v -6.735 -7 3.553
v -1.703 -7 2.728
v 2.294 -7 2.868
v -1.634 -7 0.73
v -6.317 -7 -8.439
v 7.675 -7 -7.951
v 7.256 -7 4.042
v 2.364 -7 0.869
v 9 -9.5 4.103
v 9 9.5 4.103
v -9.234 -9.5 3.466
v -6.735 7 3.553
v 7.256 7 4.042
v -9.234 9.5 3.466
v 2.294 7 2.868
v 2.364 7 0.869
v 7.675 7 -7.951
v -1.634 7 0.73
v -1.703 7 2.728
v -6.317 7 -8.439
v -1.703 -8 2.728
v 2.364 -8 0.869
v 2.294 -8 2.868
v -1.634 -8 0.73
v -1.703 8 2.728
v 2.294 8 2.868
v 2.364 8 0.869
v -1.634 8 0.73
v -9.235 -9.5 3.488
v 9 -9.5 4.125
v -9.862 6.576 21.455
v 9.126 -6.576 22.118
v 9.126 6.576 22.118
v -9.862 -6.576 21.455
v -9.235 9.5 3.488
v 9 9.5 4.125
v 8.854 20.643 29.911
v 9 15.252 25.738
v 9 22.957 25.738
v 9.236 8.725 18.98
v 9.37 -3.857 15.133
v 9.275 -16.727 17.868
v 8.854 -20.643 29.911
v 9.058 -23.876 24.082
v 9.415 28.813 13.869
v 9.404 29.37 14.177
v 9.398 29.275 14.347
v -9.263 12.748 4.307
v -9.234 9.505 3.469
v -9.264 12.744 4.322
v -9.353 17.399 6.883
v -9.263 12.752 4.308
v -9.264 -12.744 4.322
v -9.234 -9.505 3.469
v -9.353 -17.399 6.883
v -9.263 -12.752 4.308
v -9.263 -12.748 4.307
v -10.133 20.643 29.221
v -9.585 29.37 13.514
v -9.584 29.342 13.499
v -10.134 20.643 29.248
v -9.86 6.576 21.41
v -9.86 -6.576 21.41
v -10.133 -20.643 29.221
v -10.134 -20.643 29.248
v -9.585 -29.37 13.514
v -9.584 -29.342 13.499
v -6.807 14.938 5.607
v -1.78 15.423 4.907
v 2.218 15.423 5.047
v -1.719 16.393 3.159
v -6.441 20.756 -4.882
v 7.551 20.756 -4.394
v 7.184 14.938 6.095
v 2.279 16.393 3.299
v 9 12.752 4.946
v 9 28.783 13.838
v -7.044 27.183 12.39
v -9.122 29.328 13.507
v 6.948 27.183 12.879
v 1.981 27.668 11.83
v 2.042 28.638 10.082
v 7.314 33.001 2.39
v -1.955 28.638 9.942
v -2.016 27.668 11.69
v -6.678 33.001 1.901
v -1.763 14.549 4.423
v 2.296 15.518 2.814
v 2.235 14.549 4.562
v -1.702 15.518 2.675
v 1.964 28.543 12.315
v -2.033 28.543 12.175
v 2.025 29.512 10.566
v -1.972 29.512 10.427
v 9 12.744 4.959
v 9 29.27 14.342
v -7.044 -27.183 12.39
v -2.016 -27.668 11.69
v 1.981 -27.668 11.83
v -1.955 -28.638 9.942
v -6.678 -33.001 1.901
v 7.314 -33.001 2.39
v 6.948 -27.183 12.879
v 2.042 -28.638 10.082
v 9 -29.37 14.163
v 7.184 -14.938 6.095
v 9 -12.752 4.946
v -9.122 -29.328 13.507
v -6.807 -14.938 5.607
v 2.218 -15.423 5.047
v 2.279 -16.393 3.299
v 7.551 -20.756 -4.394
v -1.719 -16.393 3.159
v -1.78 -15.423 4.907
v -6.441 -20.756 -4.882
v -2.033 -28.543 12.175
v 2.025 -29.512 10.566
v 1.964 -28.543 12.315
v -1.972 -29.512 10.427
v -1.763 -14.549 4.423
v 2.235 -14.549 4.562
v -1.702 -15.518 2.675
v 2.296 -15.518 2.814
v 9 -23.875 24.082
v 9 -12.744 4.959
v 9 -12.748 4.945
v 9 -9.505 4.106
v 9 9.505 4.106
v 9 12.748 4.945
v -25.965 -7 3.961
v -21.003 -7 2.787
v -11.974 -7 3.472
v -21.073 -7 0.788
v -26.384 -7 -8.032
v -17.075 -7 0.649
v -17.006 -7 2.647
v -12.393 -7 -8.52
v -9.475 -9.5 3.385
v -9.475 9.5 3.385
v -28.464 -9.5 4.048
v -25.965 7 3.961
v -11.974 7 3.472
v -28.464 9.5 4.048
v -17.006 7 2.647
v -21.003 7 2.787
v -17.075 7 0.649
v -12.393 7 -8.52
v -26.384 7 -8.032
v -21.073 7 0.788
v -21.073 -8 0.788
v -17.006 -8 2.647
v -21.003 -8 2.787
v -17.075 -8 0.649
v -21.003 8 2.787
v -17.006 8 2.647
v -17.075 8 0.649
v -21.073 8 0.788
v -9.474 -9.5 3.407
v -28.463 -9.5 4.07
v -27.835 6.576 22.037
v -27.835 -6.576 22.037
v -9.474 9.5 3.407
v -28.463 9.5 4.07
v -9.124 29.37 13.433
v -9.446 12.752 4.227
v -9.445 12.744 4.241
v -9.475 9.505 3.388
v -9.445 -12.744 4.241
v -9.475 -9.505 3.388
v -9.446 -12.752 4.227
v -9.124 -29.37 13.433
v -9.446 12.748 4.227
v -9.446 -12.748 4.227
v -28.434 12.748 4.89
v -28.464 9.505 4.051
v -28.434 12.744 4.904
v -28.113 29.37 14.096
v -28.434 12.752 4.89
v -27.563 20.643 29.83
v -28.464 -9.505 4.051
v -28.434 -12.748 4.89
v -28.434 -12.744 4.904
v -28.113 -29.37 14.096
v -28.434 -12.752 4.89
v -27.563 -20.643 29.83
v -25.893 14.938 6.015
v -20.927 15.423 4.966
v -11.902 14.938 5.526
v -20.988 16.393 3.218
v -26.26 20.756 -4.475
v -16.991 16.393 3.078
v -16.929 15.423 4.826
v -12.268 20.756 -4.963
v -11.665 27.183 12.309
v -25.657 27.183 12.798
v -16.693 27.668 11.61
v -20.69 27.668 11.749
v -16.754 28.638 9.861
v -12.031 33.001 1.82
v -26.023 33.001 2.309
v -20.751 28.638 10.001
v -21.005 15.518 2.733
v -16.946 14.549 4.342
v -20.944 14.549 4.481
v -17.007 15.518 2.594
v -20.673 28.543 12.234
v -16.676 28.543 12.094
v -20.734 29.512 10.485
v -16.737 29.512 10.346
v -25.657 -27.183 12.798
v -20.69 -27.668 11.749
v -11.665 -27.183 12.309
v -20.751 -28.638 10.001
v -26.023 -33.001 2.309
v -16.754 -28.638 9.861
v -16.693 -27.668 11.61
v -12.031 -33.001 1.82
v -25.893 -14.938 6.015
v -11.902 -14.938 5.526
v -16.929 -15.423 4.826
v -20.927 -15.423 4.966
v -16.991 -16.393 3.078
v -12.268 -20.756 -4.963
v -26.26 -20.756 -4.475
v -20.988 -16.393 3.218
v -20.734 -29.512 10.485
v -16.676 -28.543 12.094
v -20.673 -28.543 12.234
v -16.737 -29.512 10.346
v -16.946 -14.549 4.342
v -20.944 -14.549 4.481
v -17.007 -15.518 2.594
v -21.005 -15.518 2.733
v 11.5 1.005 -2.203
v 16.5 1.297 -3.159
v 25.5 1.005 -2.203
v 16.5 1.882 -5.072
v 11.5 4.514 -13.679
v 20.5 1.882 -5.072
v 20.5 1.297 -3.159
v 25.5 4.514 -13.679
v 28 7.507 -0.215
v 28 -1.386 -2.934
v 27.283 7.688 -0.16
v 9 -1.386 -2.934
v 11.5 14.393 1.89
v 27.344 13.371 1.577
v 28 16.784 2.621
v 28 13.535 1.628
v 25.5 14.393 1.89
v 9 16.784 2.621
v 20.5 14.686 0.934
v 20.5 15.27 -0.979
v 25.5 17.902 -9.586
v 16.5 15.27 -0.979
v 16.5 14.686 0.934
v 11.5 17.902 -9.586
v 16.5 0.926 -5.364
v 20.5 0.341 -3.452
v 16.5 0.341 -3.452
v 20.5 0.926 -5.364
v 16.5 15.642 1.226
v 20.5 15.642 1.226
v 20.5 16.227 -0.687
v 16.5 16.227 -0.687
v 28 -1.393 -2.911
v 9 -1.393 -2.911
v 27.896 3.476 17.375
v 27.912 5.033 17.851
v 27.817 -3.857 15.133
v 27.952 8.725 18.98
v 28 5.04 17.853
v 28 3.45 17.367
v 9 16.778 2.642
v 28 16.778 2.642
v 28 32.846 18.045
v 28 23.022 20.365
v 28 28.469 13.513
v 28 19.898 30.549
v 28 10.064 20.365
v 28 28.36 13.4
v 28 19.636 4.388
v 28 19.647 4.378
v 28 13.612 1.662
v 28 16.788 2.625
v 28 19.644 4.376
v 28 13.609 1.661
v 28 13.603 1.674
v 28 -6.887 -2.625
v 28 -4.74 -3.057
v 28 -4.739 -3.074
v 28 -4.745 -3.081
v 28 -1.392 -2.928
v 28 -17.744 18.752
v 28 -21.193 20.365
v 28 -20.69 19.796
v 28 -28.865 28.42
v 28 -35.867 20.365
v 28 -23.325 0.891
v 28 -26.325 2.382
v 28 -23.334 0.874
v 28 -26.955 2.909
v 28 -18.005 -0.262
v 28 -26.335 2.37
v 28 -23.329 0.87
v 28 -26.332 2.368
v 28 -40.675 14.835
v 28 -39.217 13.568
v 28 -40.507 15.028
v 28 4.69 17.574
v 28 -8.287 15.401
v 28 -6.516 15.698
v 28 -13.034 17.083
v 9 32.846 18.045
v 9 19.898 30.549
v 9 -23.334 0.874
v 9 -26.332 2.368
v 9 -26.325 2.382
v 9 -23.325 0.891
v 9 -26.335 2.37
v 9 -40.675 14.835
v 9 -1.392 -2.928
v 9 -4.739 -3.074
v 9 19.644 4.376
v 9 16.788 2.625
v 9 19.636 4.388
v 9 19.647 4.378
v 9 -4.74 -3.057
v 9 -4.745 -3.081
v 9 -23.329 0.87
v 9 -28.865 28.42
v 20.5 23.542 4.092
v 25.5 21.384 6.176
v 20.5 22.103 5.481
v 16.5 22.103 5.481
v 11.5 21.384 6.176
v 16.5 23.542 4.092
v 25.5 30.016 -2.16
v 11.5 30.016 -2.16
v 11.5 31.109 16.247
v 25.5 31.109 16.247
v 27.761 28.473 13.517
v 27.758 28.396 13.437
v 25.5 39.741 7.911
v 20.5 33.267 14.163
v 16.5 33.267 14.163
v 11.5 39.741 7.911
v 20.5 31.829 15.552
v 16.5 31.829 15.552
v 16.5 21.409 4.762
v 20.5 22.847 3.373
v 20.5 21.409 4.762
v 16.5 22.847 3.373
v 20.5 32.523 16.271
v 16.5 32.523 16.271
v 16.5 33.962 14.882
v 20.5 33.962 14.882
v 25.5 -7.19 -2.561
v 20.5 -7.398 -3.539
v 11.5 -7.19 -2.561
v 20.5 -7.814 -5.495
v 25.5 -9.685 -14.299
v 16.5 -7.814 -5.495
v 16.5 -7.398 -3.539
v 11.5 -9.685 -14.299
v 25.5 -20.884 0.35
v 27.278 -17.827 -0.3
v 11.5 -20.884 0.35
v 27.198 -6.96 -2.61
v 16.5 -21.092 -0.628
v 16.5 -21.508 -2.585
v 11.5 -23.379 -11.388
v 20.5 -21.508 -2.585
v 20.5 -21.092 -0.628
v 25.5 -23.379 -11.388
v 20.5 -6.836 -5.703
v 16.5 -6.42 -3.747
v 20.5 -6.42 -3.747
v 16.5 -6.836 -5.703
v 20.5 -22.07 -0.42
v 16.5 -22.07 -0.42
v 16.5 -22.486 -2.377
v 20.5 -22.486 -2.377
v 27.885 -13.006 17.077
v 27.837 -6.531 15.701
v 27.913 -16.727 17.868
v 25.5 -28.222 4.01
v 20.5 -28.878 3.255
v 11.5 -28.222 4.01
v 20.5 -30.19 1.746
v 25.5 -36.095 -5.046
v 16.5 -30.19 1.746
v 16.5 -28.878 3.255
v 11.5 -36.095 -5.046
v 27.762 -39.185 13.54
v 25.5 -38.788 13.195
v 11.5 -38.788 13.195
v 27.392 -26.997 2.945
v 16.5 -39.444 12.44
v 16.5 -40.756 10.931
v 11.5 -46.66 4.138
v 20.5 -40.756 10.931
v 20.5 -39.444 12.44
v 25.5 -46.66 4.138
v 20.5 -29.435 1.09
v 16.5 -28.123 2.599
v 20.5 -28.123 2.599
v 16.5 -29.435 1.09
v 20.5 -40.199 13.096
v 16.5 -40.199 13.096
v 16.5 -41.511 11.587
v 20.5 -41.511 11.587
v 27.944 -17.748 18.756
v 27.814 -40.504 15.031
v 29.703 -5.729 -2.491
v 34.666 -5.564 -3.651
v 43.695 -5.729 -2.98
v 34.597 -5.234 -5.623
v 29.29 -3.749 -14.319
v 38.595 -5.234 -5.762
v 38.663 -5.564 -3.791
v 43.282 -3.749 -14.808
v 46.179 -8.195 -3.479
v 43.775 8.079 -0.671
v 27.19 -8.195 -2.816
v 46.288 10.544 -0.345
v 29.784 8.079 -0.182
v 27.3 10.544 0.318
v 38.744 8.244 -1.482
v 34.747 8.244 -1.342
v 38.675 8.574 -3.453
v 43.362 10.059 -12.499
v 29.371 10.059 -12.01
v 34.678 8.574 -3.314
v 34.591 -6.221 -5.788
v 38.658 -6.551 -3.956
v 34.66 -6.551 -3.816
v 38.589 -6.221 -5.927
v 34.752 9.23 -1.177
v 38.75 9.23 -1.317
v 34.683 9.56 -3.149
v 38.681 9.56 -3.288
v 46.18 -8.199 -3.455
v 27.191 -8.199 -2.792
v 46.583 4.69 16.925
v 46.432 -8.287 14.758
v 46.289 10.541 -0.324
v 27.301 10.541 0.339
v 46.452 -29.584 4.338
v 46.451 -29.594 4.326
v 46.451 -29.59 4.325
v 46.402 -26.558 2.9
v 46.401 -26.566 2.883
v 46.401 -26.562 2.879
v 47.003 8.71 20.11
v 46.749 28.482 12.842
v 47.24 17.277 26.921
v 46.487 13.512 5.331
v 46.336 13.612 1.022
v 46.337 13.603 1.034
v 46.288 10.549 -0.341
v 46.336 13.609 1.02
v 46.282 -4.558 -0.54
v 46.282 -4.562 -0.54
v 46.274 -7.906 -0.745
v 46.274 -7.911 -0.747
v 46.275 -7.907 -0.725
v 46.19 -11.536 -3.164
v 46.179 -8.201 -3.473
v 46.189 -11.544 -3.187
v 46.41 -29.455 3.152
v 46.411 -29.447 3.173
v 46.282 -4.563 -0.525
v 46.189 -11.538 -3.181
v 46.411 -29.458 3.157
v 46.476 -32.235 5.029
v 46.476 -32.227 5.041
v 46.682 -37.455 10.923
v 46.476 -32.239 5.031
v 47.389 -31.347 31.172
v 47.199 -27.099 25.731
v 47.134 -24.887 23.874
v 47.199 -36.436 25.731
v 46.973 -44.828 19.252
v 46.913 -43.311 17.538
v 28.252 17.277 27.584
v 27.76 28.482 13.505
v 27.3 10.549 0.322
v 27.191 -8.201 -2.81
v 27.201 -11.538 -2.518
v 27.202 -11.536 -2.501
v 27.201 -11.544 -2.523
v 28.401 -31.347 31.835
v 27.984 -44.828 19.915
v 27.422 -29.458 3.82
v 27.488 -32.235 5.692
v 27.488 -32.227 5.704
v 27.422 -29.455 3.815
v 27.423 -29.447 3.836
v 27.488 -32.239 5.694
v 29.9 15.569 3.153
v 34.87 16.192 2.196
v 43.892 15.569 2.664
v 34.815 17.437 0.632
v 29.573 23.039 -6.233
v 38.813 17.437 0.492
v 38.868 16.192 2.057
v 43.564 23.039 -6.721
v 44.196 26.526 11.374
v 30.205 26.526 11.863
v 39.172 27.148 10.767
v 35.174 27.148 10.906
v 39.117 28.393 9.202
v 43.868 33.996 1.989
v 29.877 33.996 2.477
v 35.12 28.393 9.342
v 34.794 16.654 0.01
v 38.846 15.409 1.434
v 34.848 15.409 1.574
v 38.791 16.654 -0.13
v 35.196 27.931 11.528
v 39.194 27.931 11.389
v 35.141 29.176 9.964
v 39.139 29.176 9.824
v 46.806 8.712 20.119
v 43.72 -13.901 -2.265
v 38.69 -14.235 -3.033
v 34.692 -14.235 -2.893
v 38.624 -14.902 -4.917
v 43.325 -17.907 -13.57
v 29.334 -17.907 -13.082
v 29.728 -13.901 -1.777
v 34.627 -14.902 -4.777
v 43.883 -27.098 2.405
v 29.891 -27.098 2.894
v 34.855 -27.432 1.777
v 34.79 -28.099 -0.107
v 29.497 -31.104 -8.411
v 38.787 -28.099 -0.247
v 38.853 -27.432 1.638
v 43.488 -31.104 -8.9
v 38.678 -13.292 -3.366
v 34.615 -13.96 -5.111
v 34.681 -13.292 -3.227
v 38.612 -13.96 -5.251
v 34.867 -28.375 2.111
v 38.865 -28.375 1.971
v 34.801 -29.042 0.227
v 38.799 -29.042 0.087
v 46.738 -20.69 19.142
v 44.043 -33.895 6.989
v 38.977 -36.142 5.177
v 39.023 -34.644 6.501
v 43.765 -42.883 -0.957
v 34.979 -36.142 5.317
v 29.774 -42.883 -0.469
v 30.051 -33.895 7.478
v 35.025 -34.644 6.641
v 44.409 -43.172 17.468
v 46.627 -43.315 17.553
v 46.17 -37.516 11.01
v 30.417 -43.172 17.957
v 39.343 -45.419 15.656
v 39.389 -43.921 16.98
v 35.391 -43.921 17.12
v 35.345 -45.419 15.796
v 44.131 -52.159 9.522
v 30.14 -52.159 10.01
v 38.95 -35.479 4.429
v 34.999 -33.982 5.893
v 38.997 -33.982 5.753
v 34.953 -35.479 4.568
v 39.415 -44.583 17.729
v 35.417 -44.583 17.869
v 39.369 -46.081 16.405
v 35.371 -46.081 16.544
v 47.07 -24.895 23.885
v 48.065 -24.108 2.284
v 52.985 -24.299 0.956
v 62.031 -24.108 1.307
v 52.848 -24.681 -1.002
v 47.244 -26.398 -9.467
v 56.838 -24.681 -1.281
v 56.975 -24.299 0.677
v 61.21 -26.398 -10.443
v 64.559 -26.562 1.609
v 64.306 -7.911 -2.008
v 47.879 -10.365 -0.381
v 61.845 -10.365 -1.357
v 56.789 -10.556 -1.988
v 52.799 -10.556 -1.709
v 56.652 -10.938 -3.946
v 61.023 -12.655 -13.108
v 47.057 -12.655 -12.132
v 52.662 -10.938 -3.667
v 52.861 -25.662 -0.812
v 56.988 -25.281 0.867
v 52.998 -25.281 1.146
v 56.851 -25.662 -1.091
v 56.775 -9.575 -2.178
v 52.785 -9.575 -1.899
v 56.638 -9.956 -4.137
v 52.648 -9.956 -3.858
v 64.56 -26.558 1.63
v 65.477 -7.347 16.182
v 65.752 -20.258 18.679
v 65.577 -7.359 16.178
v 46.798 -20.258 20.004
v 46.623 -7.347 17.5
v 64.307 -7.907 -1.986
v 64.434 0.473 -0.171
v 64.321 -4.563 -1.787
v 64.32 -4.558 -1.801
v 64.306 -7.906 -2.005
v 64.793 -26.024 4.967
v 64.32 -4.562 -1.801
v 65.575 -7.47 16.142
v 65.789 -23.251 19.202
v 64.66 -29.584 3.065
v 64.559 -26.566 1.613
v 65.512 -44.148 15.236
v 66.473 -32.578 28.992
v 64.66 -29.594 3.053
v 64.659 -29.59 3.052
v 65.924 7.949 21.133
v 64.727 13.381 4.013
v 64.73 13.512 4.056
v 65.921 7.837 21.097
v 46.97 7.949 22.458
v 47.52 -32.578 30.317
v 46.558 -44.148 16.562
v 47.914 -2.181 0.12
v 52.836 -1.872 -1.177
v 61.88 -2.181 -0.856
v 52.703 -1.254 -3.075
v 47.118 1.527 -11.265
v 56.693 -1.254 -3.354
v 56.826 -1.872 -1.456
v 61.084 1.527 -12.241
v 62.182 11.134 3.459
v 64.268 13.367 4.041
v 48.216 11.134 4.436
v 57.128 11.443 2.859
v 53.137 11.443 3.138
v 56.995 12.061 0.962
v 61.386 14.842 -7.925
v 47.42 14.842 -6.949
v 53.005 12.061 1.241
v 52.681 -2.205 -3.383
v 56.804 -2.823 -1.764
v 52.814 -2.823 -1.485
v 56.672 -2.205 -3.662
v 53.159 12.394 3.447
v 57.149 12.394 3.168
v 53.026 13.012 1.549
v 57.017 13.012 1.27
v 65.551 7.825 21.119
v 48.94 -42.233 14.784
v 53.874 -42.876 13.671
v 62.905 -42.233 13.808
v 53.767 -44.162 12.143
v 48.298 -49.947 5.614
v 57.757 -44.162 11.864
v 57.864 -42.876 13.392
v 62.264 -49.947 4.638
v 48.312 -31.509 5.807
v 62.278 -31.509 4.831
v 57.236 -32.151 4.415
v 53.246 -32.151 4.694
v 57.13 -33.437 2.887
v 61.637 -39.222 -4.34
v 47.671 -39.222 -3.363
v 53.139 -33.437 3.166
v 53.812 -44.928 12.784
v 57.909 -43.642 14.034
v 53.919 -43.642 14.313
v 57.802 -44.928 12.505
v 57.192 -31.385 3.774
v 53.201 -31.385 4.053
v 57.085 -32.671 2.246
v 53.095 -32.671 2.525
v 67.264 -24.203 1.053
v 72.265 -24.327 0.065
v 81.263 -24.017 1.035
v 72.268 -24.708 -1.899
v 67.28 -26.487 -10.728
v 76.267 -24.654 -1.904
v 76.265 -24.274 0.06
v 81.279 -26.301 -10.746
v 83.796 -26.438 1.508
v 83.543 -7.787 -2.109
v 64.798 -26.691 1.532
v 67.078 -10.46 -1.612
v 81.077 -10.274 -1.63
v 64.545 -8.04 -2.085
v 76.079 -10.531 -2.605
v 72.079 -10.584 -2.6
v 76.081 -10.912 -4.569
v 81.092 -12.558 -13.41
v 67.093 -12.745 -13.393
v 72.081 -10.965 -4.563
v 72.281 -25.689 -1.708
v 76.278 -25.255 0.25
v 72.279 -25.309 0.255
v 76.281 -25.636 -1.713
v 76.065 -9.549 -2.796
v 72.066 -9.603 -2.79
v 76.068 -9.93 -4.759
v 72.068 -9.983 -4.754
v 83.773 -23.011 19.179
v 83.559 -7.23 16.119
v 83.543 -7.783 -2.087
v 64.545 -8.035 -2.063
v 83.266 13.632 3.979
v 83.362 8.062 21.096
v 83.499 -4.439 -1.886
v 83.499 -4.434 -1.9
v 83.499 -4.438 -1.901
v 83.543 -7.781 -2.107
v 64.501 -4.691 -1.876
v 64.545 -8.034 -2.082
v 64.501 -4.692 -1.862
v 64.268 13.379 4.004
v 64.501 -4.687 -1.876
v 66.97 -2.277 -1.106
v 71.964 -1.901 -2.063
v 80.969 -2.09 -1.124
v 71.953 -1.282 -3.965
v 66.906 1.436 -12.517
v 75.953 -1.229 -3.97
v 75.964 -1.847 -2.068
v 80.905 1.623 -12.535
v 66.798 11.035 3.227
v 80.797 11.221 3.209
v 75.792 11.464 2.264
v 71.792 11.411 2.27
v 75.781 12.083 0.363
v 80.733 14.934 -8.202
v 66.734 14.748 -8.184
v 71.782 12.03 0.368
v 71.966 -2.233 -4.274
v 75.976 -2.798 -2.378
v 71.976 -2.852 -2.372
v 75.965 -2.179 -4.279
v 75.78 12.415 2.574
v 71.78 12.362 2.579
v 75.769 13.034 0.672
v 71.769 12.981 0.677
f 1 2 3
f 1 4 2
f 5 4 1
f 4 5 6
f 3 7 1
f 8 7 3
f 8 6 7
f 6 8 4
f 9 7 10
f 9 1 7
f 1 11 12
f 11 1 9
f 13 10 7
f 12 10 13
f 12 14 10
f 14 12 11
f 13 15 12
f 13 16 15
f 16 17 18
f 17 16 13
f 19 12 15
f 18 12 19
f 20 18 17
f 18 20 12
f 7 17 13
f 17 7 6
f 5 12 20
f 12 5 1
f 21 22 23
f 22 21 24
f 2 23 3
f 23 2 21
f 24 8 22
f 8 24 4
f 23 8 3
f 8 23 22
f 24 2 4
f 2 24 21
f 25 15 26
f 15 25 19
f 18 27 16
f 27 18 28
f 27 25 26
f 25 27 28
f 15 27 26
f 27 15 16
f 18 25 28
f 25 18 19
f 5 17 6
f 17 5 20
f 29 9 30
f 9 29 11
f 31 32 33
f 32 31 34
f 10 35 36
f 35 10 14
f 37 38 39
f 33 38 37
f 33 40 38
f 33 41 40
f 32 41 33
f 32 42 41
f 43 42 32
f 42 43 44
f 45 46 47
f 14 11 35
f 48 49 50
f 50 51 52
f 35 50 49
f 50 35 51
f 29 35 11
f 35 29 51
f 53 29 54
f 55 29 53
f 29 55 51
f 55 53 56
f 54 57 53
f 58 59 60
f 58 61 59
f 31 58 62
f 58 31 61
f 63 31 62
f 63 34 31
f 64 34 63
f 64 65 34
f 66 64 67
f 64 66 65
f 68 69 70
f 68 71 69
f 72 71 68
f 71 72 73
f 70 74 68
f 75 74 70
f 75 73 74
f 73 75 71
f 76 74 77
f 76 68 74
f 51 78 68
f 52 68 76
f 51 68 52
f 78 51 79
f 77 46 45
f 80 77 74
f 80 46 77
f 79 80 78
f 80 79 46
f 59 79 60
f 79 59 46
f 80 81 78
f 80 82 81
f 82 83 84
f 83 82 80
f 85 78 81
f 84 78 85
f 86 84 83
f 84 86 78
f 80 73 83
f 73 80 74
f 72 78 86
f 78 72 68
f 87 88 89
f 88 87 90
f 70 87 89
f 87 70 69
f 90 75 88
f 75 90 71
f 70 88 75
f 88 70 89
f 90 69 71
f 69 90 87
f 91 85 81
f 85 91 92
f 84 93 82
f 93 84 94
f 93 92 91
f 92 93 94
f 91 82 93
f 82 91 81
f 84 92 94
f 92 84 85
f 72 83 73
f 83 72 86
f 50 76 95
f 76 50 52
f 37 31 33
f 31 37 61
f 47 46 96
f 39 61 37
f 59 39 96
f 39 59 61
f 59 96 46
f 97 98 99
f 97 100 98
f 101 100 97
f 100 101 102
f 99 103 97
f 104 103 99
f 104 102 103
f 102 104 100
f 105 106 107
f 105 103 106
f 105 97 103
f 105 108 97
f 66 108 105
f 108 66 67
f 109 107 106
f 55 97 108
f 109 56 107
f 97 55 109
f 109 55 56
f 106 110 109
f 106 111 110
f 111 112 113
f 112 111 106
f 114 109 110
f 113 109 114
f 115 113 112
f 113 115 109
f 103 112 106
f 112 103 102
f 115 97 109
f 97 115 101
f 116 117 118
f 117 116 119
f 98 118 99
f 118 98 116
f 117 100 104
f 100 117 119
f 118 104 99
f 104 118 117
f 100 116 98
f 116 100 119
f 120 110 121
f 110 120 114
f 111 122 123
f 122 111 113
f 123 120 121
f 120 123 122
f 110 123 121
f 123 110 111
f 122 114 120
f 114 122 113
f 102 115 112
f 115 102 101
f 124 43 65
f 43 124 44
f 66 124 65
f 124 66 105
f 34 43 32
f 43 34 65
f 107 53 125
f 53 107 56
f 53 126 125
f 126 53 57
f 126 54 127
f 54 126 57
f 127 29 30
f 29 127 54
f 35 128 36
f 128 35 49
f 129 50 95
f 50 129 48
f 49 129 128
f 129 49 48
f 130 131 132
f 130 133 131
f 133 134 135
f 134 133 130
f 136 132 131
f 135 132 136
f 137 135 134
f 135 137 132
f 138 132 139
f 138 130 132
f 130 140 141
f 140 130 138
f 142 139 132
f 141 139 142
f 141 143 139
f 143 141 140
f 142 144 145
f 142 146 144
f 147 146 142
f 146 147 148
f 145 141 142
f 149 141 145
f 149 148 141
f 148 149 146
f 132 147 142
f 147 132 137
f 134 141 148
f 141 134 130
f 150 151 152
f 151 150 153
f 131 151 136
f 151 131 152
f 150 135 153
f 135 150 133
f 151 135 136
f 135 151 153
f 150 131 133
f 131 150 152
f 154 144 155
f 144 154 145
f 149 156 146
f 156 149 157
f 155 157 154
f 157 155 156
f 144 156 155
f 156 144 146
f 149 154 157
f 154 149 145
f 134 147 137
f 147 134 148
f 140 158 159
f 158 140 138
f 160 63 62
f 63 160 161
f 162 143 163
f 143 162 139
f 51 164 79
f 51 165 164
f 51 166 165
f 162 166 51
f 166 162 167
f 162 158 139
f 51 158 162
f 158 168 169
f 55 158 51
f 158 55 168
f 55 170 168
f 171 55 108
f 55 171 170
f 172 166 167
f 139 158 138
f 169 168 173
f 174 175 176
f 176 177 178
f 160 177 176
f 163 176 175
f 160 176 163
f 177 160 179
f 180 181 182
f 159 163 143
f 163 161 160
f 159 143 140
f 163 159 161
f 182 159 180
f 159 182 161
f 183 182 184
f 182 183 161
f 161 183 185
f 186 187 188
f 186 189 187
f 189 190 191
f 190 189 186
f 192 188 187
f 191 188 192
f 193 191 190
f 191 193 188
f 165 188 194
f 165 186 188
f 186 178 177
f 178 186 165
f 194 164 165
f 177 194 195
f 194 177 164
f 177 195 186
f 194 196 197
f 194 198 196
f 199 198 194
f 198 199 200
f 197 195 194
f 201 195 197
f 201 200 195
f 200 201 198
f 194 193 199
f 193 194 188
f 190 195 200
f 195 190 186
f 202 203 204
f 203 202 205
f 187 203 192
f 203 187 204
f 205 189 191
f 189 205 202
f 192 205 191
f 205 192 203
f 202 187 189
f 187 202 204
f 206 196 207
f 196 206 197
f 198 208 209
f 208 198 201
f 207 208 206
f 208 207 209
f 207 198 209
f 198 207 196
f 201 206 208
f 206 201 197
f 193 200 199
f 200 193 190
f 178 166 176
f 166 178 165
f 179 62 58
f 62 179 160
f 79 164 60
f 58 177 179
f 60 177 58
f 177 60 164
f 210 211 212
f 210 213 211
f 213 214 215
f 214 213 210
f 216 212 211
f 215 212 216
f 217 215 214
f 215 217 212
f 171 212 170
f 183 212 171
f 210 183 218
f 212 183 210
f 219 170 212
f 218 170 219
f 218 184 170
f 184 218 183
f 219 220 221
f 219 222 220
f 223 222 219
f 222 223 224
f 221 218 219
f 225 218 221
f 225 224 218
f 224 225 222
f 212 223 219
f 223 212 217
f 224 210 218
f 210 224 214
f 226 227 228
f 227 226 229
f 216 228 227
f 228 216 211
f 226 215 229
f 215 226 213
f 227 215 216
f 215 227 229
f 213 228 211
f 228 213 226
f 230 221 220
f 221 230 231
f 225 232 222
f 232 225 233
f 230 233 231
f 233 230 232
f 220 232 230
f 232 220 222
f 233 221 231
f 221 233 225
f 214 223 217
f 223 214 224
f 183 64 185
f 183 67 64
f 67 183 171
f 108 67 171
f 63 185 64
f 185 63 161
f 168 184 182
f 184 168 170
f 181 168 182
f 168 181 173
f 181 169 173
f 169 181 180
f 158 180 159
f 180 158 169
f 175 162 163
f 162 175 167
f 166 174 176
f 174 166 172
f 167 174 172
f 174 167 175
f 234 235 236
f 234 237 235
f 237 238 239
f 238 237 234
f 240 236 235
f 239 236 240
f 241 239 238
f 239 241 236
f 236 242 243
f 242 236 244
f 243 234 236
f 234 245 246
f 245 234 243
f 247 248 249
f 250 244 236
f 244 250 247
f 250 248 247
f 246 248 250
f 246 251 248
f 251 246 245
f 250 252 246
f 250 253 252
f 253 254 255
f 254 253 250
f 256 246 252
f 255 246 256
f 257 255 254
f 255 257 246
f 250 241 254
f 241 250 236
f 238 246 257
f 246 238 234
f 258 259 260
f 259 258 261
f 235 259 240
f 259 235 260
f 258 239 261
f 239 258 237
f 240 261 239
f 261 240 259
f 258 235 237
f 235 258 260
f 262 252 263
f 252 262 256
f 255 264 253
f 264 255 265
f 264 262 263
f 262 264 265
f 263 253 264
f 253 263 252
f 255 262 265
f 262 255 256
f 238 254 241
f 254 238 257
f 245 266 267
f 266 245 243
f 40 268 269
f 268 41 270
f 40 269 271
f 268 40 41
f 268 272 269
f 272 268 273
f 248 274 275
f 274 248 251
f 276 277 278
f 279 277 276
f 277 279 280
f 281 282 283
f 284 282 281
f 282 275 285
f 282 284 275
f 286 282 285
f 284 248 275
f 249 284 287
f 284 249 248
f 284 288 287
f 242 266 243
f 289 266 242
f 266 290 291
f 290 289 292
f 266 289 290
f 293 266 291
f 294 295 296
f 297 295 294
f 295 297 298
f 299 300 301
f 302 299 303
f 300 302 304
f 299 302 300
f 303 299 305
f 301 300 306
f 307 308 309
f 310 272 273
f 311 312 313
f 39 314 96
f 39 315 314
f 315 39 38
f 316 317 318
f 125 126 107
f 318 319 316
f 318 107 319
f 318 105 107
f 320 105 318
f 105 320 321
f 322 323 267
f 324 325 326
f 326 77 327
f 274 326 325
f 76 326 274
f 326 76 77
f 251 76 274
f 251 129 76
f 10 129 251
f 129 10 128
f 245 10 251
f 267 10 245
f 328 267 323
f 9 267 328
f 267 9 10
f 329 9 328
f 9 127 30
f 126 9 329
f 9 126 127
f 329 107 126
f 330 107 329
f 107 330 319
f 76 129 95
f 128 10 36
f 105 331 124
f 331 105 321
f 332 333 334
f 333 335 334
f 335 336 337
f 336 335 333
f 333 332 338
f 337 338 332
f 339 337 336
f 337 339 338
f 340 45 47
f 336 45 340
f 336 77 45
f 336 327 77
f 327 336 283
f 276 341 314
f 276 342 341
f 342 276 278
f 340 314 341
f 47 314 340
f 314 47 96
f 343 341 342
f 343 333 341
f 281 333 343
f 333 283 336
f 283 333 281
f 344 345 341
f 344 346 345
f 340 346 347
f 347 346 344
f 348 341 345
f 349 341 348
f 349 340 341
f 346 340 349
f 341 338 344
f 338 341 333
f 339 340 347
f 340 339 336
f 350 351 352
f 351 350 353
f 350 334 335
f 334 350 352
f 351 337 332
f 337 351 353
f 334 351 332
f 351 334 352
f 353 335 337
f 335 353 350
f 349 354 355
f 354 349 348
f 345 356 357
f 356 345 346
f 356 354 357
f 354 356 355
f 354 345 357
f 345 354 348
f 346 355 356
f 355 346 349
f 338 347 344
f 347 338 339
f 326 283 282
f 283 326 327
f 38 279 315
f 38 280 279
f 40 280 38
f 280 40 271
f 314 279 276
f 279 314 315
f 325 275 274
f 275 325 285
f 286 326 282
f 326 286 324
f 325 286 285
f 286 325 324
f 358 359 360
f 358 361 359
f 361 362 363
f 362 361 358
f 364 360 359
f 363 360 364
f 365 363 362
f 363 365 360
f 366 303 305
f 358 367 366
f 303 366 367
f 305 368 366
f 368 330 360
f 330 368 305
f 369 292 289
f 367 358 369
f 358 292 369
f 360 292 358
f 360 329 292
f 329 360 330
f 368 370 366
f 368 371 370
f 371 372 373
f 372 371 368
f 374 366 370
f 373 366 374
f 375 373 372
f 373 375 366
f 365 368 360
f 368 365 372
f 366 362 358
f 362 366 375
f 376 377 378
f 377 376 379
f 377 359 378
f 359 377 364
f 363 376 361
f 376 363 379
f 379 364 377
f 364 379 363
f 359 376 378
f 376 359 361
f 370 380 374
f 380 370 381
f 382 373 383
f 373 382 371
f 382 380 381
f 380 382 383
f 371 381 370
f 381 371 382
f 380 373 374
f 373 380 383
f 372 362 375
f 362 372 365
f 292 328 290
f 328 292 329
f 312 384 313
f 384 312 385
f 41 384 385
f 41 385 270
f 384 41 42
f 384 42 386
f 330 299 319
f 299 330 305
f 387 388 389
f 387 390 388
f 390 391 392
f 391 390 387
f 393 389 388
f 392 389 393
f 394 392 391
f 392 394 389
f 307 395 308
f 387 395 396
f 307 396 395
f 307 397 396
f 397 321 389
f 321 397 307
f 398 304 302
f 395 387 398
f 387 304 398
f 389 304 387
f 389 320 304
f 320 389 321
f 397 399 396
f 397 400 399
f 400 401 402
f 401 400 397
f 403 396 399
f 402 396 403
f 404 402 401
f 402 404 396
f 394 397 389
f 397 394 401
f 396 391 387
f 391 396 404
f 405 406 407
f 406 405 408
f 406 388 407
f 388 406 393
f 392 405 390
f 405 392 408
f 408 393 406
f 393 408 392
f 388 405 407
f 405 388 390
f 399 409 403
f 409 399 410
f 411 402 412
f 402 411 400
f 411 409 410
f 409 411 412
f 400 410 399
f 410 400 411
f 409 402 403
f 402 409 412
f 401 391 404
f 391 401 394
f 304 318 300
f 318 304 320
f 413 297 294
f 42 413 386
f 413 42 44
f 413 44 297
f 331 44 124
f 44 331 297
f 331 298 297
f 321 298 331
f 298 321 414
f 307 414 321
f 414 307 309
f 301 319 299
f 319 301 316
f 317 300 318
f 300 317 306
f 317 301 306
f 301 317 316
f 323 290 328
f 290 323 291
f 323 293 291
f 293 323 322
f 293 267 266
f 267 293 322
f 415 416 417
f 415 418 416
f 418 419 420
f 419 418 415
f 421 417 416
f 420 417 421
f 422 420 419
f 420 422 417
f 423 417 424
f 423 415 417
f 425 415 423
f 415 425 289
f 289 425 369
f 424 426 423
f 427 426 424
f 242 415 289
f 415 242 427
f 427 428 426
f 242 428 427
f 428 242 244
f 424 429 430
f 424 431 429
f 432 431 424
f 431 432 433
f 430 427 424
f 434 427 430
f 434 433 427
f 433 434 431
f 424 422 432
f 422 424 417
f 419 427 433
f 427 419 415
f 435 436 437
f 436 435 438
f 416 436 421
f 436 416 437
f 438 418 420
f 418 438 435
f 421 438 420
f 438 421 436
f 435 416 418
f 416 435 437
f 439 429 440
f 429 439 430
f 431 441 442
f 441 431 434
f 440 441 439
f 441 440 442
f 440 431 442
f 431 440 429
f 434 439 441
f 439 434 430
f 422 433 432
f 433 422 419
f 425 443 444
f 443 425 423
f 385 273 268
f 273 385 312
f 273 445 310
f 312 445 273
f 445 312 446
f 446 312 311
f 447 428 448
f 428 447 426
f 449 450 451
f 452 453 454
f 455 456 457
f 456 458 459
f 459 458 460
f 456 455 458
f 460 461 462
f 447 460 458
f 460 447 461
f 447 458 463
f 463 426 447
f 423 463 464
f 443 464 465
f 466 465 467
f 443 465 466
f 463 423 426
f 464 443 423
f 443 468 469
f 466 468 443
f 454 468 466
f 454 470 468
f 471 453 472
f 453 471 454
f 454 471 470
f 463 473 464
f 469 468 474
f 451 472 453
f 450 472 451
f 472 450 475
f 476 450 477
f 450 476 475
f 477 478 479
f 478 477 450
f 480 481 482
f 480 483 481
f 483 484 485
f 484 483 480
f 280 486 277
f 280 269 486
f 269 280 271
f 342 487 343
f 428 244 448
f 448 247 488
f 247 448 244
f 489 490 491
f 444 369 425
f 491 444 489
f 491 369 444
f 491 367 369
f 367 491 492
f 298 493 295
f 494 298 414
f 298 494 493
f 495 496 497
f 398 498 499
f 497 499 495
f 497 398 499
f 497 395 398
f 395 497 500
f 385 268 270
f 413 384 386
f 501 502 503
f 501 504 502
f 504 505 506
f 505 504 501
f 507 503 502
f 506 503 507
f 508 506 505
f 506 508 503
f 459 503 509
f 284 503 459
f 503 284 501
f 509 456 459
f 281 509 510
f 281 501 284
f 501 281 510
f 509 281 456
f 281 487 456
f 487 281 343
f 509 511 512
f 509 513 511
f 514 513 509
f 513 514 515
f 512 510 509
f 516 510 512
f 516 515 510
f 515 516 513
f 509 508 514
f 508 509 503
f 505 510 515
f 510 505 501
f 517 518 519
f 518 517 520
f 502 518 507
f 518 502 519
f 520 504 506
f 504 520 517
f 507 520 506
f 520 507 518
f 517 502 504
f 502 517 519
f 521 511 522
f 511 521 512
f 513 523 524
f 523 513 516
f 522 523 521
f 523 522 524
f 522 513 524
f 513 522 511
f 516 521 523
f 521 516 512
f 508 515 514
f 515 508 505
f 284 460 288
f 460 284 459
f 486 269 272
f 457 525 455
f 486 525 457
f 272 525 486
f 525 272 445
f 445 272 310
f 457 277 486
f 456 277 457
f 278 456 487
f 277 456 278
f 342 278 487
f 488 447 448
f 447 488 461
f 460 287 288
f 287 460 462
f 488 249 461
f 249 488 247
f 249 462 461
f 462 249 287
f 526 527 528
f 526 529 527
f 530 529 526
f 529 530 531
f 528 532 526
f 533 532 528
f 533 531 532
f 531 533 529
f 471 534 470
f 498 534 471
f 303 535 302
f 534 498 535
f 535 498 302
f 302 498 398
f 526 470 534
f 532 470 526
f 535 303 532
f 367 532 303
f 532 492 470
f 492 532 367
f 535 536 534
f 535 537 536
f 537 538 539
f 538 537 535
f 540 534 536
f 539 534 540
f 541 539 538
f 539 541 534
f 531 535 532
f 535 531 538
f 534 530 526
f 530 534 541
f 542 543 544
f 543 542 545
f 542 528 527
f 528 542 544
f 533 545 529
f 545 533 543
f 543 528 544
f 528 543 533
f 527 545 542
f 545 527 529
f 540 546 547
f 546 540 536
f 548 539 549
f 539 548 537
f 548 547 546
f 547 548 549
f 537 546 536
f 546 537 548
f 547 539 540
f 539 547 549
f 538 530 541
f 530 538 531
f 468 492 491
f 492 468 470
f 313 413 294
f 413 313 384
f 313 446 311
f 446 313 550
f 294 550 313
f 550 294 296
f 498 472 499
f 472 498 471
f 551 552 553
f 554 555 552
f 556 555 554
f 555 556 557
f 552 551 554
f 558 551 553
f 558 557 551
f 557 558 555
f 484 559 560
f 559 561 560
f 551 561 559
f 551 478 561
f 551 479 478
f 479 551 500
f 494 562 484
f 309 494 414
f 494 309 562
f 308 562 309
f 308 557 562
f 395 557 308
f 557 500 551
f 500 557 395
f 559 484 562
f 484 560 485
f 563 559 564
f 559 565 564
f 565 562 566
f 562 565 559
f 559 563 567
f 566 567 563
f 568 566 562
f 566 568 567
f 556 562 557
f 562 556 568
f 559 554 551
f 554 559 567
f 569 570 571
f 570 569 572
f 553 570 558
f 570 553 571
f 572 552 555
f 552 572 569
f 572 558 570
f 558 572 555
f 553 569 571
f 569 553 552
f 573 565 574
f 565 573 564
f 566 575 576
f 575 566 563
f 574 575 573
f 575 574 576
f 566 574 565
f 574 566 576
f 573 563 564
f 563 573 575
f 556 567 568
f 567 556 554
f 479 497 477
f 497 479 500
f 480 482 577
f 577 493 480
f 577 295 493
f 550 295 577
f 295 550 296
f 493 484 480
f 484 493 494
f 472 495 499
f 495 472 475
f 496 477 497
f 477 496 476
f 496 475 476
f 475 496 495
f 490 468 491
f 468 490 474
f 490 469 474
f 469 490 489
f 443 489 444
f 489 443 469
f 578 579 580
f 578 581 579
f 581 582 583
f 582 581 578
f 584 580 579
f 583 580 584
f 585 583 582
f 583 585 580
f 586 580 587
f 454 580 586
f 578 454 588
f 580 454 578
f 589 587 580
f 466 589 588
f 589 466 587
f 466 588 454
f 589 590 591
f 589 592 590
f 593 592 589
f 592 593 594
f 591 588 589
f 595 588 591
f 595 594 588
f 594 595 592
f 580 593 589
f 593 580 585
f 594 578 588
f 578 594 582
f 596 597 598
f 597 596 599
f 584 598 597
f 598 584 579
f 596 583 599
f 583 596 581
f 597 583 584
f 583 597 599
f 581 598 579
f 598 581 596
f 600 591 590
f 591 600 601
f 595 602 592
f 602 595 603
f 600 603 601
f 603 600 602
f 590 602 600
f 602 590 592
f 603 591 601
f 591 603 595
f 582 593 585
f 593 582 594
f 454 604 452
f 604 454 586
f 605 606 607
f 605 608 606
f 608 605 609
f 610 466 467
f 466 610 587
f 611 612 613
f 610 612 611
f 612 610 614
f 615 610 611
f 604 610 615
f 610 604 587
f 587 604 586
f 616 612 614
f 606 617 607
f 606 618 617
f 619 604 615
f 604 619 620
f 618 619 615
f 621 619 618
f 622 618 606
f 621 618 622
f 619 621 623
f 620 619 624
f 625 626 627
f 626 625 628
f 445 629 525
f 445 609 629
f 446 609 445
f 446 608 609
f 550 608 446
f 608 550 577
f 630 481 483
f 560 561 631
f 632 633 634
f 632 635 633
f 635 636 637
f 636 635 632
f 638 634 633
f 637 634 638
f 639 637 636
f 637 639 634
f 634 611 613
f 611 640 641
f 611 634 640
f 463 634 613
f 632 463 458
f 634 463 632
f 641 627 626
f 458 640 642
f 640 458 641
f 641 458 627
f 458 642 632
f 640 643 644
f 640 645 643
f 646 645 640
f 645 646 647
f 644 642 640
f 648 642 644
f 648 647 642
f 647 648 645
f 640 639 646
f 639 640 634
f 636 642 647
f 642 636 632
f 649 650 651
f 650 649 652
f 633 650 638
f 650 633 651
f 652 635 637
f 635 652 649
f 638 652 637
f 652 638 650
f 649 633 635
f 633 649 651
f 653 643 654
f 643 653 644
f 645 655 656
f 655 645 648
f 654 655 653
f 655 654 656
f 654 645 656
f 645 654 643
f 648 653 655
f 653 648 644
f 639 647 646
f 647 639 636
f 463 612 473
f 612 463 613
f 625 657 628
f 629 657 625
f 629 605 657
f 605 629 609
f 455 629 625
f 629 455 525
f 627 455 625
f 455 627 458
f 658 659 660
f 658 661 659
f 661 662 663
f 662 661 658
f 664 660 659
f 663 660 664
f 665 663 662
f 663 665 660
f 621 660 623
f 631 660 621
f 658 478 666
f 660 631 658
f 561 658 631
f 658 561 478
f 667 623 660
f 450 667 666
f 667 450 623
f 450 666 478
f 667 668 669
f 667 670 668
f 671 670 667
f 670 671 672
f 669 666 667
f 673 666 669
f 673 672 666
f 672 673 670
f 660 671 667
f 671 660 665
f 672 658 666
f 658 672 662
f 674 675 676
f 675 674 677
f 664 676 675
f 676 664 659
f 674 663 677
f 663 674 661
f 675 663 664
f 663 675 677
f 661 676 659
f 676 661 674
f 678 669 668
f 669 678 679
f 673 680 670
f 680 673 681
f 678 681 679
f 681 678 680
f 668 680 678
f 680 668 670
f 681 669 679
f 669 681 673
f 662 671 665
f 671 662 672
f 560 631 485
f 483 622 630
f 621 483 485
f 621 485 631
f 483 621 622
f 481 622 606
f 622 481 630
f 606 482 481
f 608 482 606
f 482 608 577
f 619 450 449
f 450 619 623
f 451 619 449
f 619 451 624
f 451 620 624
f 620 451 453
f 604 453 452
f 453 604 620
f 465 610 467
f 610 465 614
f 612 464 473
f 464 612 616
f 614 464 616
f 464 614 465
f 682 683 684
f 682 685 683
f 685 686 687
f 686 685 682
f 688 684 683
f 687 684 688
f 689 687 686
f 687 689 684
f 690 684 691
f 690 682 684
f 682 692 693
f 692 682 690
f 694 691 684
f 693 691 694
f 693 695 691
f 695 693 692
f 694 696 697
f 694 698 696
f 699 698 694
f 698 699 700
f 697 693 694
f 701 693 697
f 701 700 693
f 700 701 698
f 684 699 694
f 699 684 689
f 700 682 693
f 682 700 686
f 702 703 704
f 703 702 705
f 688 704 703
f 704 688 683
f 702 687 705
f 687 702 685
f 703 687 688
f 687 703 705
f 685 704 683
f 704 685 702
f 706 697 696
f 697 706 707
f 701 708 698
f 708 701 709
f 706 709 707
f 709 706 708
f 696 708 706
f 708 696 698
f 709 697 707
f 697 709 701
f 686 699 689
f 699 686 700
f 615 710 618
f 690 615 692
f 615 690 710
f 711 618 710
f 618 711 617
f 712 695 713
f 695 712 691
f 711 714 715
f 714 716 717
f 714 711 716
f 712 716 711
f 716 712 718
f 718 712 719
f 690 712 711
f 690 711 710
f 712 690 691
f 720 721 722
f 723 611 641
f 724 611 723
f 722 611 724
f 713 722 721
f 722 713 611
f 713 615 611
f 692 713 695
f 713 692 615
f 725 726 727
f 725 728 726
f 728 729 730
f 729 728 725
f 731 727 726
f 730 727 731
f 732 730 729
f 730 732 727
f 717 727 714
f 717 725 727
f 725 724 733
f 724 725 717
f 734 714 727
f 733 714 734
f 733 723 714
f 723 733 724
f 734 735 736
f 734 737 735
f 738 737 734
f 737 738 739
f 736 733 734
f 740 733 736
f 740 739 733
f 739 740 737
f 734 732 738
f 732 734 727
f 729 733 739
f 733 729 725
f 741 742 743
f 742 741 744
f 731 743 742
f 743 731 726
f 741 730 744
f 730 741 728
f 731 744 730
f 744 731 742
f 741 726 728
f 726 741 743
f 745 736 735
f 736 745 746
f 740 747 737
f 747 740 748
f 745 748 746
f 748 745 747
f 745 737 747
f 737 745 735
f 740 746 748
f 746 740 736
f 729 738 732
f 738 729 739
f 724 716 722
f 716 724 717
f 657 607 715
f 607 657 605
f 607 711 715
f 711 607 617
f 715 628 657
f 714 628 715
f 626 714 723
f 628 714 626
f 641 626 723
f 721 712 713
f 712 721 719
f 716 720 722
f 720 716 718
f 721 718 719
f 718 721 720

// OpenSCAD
sqr = sqrt(2);

module mount_hole() {
    cube([1,4,2], center=true);
}

// mount_hole();

module keycap() {
  rotate([0,0,45]) cylinder(10,18/2*sqr,14/2*sqr,$fn=4);
}

// keycap();

module switch() {
  translate([0,0,2]) cube([14,14,4], center=true);
  translate([0,0,4.5]) cube([16,16,1], center=true);
  translate([0,0,7.5]) cube([14,14,5], center=true);
}

// switch();

module key() {
    switch();
    color("red") translate([7.5,0,2]) mount_hole();
    color("red") translate([-7.5,0,2]) mount_hole();
    color("red", 0.5) translate([0,0,-4]) cube([14,14,8], center=true); // wire hole
    color("cyan", 0.5) translate([0,0,13]) cube([19,19,18], center=true); // keywell hole
    translate([0,0,10]) keycap();
}

// key();

dx = 5;
dz = 5.95;
angle = 29;

module duo() {
    translate([-18-dx, 0, dz]) rotate([0, angle, 0]) key();
    key();
    translate([-12.128,0,0.55]) rotate([0,angle/2,0]) color("cyan", 0.5) translate([0,0,13]) cube([3.35,19,18], center=true); // keywell hole
}

// duo();

module trio() {
    translate([12.128,0,0.55]) rotate([0,-angle/2,0]) color("cyan", 0.5) translate([0,0,13]) cube([3.35,19,18], center=true); // keywell hole
    translate([-18-dx, 0, dz]) rotate([0, angle, 0]) key();
    key();
    translate([18+dx, 0, dz]) rotate([0, -angle, 0]) key();
    translate([-12.128,0,0.55]) rotate([0,angle/2,0]) color("cyan", 0.5) translate([0,0,13]) cube([3.35,19,18], center=true); // keywell hole
}

// trio();

module quatro() {
    translate([-11.88, 0, 0]) rotate([0, angle/2, 0]) duo();
    translate([11.88, 0, 0]) rotate([0, -angle/2, 0]) rotate([0,0,180]) duo();
    color("cyan", 0.5) translate([0,0,13-2.5]) cube([3.35,19,18], center=true); // keywell hole
}

// quatro();

module cluster() {
    translate([0,0.4,-0.2]) rotate([2,0,0]) {
        translate([0,-18-1.5,0.6]) rotate([-4,0,0]) trio();
        trio();
    }
    translate([3,0,-4.5]) translate([0, 18+0.5, 0]) rotate([0,2.5,0]) quatro();
    translate([0,-0.2,0.8]) rotate([-2,0,0]) {
        translate([10,0,-4]) translate([0, 2*(18+0.5), 0]) rotate([0,-5,0]) quatro();
        translate([0,-0.4,1.6]) rotate([-2,0,0]) {
            translate([18,0,-2]) translate([0, 3*(18+0.5), 0]) rotate([0,-11,0]) trio();
            translate([18,1,-2+0.6]) translate([0, 4*(18+0.5), 0]) rotate([4,-11,0]) duo();
        }
    }
}

rotate([0,0,-90]) cluster();
